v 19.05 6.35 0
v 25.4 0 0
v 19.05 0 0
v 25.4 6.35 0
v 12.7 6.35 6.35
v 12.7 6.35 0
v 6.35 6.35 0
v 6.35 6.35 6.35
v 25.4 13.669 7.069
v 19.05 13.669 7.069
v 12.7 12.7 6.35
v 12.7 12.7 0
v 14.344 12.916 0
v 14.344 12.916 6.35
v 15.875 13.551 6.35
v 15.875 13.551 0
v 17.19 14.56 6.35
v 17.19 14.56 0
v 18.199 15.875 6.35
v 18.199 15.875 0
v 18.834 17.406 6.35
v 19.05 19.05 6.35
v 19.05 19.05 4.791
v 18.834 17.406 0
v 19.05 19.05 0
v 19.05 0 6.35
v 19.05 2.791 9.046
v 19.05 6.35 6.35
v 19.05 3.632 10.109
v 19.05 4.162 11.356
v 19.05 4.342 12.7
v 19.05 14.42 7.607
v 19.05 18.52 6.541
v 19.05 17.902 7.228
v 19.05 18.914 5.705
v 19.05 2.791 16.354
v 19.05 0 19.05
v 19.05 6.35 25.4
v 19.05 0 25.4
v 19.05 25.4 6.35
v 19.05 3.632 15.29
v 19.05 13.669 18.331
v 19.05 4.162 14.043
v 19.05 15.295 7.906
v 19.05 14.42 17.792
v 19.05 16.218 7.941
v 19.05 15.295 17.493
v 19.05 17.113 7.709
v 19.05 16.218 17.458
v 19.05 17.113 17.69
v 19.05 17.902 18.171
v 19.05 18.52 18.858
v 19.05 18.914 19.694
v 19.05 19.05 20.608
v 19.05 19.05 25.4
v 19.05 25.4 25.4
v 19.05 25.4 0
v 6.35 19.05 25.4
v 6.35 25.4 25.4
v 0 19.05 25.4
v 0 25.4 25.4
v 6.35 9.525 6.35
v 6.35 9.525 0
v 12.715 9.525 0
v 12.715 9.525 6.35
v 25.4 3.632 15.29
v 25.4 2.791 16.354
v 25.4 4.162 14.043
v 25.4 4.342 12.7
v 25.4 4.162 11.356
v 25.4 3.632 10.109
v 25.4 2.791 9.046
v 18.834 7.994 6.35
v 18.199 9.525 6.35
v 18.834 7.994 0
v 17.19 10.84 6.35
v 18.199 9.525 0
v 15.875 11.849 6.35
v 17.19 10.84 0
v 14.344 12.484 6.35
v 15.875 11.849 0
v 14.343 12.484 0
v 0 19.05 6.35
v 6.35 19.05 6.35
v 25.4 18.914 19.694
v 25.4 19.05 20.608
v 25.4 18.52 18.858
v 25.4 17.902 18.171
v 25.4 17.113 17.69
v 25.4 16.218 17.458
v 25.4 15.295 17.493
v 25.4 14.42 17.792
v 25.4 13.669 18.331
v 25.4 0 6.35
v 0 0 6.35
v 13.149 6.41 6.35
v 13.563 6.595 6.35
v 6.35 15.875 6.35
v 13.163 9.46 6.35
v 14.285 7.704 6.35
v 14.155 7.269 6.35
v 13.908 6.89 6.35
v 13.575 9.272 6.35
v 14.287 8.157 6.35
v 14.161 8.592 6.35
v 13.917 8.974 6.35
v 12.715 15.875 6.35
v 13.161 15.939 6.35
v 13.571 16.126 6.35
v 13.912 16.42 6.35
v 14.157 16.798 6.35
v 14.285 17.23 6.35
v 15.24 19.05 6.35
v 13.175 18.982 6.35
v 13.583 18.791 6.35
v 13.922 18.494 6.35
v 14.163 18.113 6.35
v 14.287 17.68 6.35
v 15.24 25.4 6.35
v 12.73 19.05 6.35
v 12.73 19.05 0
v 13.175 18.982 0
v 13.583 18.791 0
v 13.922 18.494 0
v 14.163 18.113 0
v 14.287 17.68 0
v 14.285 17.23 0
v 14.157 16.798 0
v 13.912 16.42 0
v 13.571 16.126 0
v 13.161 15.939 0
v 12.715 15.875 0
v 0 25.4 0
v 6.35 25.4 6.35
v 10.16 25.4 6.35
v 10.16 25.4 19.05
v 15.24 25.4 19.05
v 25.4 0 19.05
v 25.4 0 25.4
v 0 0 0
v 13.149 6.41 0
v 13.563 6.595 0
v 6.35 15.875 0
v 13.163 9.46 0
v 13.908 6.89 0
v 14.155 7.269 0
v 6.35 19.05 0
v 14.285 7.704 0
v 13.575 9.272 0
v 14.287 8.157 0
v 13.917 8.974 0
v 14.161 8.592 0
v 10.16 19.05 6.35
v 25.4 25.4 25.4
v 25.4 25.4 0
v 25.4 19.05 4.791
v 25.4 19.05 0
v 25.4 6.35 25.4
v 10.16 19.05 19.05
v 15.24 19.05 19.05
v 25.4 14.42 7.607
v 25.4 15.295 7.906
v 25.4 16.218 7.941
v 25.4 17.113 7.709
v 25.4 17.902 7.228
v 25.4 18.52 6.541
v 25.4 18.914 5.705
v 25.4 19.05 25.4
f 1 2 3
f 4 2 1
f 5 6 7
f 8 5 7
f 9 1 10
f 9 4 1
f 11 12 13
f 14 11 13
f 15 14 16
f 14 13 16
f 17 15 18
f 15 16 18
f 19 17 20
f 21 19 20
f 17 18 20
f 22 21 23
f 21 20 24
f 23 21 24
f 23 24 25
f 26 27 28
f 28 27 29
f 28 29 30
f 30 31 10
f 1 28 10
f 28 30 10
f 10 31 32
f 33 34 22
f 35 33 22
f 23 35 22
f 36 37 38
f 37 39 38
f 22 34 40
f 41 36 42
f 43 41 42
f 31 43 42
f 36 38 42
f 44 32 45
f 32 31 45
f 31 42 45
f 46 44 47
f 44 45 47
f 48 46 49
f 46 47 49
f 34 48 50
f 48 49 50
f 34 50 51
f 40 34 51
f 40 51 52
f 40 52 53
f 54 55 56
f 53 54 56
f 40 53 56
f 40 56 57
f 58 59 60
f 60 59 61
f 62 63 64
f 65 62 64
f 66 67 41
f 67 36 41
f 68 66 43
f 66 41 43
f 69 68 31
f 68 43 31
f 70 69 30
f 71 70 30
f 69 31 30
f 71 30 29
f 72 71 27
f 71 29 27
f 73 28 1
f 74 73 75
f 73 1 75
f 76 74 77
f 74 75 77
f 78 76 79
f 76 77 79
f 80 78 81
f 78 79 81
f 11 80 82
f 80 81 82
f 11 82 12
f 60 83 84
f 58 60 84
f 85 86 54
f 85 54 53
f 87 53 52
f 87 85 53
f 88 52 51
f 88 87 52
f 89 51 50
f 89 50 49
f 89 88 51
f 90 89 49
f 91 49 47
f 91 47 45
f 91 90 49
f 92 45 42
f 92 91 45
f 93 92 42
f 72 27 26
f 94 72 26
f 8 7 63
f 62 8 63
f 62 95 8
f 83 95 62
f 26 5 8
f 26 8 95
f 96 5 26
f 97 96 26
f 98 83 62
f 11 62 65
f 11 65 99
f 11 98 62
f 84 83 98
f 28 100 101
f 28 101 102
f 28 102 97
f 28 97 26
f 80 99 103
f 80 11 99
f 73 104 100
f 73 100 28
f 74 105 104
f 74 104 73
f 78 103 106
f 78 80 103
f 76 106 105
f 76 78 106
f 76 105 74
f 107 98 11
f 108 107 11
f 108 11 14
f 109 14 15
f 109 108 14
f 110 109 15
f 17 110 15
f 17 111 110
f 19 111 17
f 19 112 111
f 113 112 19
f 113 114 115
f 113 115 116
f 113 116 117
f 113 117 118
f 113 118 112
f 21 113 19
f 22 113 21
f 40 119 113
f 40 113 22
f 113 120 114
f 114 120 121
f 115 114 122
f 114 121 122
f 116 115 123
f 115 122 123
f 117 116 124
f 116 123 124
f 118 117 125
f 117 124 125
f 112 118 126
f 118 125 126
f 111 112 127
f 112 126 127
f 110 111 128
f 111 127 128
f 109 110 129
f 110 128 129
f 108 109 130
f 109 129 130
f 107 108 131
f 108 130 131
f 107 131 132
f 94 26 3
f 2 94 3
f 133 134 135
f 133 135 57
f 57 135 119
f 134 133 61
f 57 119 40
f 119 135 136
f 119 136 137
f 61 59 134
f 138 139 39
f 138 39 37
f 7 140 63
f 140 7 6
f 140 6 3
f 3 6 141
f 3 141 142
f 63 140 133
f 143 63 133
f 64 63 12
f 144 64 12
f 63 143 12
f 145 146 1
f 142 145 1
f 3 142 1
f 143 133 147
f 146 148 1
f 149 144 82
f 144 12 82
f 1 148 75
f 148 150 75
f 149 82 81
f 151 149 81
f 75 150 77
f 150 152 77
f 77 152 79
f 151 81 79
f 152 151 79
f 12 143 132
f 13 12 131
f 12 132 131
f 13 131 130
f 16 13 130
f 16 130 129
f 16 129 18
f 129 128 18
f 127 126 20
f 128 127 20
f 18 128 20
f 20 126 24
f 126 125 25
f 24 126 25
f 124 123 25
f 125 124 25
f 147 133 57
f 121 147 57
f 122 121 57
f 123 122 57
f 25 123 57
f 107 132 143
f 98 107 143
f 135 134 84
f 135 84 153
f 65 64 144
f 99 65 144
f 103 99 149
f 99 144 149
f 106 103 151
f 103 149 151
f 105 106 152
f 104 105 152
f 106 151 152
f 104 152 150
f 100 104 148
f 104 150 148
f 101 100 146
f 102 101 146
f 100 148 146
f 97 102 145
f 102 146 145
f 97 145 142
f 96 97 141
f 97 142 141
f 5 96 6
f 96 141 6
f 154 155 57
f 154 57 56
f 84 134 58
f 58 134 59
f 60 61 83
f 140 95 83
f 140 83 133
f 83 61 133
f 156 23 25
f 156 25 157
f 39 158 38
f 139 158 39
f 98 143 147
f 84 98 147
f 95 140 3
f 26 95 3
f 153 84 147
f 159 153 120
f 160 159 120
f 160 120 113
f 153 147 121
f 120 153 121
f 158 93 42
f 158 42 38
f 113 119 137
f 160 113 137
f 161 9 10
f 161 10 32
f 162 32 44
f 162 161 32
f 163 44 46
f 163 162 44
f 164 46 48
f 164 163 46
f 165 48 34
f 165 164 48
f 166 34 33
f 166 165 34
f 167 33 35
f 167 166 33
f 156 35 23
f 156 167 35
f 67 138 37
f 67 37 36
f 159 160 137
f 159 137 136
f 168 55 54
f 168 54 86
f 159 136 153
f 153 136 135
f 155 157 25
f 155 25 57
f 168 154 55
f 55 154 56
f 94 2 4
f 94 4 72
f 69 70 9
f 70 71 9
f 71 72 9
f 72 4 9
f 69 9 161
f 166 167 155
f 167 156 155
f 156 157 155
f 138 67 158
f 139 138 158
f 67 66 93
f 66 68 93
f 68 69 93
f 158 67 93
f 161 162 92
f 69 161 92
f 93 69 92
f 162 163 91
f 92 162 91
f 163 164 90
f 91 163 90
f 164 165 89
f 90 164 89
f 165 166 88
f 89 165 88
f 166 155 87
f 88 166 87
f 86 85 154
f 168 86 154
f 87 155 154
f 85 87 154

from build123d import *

# Parameters (mm, degrees)
F5_DEPTH = 6.35
F6_DEPTH = 6.35
F7_DEPTH = 6.35
F8_R     = 5.08


with BuildPart() as f5:
    # F2 (on Top) → F5 (new body)
    with BuildSketch(Plane.XY):
        with BuildLine():
            Line((0, 25.4), (0, 0))
            Line((0, 0), (19.05, 0))
            Line((19.05, 0), (19.05, 6.35))
            ThreePointArc((19.05, 6.35), (17.190128, 10.840128), (12.7, 12.7))
            ThreePointArc((12.7, 12.7), (17.190128, 14.559872), (19.05, 19.05))
            Line((19.05, 19.05), (19.05, 25.4))
            Line((19.05, 25.4), (0, 25.4))
        make_face()
        with BuildLine():
            Line((6.35, 6.35), (6.35, 9.525))
            Line((6.35, 9.525), (12.714883, 9.525))
            ThreePointArc((12.714883, 9.525), (14.3024, 7.930024), (12.7, 6.35))
            Line((12.7, 6.35), (6.35, 6.35))
        make_face(mode=Mode.SUBTRACT)
        with BuildLine():
            Line((6.35, 15.875), (6.35, 19.05))
            Line((6.35, 19.05), (12.7, 19.05))
            ThreePointArc((12.7, 19.05), (14.3024, 17.469976), (12.714883, 15.875))
            Line((12.714883, 15.875), (6.35, 15.875))
        make_face(mode=Mode.SUBTRACT)
    extrude(amount=F5_DEPTH)

    # F4 (on offset) → F6 (join)
    with BuildSketch(Plane.YZ.offset(25.4)):
        with BuildLine():
            Line((19.050006, -0.00045), (25.400006, -0.00045))
            Line((25.400006, -0.00045), (25.400006, 25.39955))
            Line((25.400006, 25.39955), (19.050006, 25.39955))
            Line((19.050006, 25.39955), (19.050006, 20.614292))
            ThreePointArc((19.050006, 20.614292), (17.11549, 17.691652), (13.669329, 18.330519))
            Line((13.669329, 18.330519), (6.350006, 25.39955))
            Line((6.350006, 25.39955), (6e-06, 25.39955))
            Line((6e-06, 25.39955), (6e-06, 19.04955))
            Line((6e-06, 19.04955), (6.57484, 12.69955))
            Line((6.57484, 12.69955), (6e-06, 6.34955))
            Line((6e-06, 6.34955), (6e-06, -0.00045))
            Line((6e-06, -0.00045), (6.350006, -0.00045))
            Line((6.350006, -0.00045), (13.669329, 7.068581))
            ThreePointArc((13.669329, 7.068581), (17.11549, 7.707448), (19.050006, 4.784809))
            Line((19.050006, 4.784809), (19.050006, -0.00045))
        make_face()
    extrude(amount=-F6_DEPTH)

    # F3 (on offset) → F7 (join)
    with BuildSketch(Plane.XZ.offset(-25.4)):
        Polygon((6.35, 25.4), (0, 25.4), (0, 0), (25.4, 0), (25.4, 25.4), (19.05, 25.4), (19.05, 6.35), (15.24, 6.35), (15.24, 19.05), (10.16, 19.05), (10.16, 6.35), (6.35, 6.35), align=None)
    extrude(amount=F7_DEPTH)

    # F8
    f8_edges = [f5.edges().sort_by_distance(p)[0] for p in [
        (22.225, 6.57484, 12.69955),
    ]]
    fillet(f8_edges, radius=F8_R)


solid = f5.part
